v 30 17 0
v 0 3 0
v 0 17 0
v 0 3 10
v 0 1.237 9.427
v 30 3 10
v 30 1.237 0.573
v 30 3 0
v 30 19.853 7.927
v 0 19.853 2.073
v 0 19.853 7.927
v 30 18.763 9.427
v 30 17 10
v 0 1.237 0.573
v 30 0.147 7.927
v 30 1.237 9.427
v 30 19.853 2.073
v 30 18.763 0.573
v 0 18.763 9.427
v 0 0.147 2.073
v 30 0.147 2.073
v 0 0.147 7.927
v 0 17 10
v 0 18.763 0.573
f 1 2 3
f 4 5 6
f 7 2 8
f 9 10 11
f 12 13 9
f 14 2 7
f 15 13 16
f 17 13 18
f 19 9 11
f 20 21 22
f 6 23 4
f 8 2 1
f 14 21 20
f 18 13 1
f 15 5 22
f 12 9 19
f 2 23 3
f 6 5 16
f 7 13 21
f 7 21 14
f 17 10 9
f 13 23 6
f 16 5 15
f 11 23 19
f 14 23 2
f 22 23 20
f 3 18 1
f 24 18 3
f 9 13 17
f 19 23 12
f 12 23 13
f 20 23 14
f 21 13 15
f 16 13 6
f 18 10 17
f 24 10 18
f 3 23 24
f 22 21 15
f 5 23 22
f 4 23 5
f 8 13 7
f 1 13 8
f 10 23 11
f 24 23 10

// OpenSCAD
module roundedcube(lx, ly, lz, radius) {
translate([radius, radius, radius])
minkowski() {
cube([lx-2*radius, ly-2*radius, lz-2*radius]);
sphere(r=radius);
}
}


module roundedcubexy(lx,ly,lz,radius) {
translate([radius, radius, 0])
minkowski() {
cube([lx-2*radius,ly-2*radius,lz/2]);
cylinder(r=radius, h=lz/2);
}
}

module roundedcubexz(lx,ly,lz,radius) {
translate([radius, 0, radius])
minkowski() {
cube([lx-2*radius, ly/2, lz-2*radius]);
rotate([-90, 0, 0])
	cylinder(r=radius, h=ly/2);
}
}

module roundedcubeyz(lx,ly,lz,radius) {
translate([0, radius, radius])
minkowski() {
cube([lx/2, ly-2*radius, lz-2*radius]);
rotate([0, 90, 0])
	cylinder(r=radius, h=lx/2);
}
}

roundedcubeyz(30, 20, 10, 3);
